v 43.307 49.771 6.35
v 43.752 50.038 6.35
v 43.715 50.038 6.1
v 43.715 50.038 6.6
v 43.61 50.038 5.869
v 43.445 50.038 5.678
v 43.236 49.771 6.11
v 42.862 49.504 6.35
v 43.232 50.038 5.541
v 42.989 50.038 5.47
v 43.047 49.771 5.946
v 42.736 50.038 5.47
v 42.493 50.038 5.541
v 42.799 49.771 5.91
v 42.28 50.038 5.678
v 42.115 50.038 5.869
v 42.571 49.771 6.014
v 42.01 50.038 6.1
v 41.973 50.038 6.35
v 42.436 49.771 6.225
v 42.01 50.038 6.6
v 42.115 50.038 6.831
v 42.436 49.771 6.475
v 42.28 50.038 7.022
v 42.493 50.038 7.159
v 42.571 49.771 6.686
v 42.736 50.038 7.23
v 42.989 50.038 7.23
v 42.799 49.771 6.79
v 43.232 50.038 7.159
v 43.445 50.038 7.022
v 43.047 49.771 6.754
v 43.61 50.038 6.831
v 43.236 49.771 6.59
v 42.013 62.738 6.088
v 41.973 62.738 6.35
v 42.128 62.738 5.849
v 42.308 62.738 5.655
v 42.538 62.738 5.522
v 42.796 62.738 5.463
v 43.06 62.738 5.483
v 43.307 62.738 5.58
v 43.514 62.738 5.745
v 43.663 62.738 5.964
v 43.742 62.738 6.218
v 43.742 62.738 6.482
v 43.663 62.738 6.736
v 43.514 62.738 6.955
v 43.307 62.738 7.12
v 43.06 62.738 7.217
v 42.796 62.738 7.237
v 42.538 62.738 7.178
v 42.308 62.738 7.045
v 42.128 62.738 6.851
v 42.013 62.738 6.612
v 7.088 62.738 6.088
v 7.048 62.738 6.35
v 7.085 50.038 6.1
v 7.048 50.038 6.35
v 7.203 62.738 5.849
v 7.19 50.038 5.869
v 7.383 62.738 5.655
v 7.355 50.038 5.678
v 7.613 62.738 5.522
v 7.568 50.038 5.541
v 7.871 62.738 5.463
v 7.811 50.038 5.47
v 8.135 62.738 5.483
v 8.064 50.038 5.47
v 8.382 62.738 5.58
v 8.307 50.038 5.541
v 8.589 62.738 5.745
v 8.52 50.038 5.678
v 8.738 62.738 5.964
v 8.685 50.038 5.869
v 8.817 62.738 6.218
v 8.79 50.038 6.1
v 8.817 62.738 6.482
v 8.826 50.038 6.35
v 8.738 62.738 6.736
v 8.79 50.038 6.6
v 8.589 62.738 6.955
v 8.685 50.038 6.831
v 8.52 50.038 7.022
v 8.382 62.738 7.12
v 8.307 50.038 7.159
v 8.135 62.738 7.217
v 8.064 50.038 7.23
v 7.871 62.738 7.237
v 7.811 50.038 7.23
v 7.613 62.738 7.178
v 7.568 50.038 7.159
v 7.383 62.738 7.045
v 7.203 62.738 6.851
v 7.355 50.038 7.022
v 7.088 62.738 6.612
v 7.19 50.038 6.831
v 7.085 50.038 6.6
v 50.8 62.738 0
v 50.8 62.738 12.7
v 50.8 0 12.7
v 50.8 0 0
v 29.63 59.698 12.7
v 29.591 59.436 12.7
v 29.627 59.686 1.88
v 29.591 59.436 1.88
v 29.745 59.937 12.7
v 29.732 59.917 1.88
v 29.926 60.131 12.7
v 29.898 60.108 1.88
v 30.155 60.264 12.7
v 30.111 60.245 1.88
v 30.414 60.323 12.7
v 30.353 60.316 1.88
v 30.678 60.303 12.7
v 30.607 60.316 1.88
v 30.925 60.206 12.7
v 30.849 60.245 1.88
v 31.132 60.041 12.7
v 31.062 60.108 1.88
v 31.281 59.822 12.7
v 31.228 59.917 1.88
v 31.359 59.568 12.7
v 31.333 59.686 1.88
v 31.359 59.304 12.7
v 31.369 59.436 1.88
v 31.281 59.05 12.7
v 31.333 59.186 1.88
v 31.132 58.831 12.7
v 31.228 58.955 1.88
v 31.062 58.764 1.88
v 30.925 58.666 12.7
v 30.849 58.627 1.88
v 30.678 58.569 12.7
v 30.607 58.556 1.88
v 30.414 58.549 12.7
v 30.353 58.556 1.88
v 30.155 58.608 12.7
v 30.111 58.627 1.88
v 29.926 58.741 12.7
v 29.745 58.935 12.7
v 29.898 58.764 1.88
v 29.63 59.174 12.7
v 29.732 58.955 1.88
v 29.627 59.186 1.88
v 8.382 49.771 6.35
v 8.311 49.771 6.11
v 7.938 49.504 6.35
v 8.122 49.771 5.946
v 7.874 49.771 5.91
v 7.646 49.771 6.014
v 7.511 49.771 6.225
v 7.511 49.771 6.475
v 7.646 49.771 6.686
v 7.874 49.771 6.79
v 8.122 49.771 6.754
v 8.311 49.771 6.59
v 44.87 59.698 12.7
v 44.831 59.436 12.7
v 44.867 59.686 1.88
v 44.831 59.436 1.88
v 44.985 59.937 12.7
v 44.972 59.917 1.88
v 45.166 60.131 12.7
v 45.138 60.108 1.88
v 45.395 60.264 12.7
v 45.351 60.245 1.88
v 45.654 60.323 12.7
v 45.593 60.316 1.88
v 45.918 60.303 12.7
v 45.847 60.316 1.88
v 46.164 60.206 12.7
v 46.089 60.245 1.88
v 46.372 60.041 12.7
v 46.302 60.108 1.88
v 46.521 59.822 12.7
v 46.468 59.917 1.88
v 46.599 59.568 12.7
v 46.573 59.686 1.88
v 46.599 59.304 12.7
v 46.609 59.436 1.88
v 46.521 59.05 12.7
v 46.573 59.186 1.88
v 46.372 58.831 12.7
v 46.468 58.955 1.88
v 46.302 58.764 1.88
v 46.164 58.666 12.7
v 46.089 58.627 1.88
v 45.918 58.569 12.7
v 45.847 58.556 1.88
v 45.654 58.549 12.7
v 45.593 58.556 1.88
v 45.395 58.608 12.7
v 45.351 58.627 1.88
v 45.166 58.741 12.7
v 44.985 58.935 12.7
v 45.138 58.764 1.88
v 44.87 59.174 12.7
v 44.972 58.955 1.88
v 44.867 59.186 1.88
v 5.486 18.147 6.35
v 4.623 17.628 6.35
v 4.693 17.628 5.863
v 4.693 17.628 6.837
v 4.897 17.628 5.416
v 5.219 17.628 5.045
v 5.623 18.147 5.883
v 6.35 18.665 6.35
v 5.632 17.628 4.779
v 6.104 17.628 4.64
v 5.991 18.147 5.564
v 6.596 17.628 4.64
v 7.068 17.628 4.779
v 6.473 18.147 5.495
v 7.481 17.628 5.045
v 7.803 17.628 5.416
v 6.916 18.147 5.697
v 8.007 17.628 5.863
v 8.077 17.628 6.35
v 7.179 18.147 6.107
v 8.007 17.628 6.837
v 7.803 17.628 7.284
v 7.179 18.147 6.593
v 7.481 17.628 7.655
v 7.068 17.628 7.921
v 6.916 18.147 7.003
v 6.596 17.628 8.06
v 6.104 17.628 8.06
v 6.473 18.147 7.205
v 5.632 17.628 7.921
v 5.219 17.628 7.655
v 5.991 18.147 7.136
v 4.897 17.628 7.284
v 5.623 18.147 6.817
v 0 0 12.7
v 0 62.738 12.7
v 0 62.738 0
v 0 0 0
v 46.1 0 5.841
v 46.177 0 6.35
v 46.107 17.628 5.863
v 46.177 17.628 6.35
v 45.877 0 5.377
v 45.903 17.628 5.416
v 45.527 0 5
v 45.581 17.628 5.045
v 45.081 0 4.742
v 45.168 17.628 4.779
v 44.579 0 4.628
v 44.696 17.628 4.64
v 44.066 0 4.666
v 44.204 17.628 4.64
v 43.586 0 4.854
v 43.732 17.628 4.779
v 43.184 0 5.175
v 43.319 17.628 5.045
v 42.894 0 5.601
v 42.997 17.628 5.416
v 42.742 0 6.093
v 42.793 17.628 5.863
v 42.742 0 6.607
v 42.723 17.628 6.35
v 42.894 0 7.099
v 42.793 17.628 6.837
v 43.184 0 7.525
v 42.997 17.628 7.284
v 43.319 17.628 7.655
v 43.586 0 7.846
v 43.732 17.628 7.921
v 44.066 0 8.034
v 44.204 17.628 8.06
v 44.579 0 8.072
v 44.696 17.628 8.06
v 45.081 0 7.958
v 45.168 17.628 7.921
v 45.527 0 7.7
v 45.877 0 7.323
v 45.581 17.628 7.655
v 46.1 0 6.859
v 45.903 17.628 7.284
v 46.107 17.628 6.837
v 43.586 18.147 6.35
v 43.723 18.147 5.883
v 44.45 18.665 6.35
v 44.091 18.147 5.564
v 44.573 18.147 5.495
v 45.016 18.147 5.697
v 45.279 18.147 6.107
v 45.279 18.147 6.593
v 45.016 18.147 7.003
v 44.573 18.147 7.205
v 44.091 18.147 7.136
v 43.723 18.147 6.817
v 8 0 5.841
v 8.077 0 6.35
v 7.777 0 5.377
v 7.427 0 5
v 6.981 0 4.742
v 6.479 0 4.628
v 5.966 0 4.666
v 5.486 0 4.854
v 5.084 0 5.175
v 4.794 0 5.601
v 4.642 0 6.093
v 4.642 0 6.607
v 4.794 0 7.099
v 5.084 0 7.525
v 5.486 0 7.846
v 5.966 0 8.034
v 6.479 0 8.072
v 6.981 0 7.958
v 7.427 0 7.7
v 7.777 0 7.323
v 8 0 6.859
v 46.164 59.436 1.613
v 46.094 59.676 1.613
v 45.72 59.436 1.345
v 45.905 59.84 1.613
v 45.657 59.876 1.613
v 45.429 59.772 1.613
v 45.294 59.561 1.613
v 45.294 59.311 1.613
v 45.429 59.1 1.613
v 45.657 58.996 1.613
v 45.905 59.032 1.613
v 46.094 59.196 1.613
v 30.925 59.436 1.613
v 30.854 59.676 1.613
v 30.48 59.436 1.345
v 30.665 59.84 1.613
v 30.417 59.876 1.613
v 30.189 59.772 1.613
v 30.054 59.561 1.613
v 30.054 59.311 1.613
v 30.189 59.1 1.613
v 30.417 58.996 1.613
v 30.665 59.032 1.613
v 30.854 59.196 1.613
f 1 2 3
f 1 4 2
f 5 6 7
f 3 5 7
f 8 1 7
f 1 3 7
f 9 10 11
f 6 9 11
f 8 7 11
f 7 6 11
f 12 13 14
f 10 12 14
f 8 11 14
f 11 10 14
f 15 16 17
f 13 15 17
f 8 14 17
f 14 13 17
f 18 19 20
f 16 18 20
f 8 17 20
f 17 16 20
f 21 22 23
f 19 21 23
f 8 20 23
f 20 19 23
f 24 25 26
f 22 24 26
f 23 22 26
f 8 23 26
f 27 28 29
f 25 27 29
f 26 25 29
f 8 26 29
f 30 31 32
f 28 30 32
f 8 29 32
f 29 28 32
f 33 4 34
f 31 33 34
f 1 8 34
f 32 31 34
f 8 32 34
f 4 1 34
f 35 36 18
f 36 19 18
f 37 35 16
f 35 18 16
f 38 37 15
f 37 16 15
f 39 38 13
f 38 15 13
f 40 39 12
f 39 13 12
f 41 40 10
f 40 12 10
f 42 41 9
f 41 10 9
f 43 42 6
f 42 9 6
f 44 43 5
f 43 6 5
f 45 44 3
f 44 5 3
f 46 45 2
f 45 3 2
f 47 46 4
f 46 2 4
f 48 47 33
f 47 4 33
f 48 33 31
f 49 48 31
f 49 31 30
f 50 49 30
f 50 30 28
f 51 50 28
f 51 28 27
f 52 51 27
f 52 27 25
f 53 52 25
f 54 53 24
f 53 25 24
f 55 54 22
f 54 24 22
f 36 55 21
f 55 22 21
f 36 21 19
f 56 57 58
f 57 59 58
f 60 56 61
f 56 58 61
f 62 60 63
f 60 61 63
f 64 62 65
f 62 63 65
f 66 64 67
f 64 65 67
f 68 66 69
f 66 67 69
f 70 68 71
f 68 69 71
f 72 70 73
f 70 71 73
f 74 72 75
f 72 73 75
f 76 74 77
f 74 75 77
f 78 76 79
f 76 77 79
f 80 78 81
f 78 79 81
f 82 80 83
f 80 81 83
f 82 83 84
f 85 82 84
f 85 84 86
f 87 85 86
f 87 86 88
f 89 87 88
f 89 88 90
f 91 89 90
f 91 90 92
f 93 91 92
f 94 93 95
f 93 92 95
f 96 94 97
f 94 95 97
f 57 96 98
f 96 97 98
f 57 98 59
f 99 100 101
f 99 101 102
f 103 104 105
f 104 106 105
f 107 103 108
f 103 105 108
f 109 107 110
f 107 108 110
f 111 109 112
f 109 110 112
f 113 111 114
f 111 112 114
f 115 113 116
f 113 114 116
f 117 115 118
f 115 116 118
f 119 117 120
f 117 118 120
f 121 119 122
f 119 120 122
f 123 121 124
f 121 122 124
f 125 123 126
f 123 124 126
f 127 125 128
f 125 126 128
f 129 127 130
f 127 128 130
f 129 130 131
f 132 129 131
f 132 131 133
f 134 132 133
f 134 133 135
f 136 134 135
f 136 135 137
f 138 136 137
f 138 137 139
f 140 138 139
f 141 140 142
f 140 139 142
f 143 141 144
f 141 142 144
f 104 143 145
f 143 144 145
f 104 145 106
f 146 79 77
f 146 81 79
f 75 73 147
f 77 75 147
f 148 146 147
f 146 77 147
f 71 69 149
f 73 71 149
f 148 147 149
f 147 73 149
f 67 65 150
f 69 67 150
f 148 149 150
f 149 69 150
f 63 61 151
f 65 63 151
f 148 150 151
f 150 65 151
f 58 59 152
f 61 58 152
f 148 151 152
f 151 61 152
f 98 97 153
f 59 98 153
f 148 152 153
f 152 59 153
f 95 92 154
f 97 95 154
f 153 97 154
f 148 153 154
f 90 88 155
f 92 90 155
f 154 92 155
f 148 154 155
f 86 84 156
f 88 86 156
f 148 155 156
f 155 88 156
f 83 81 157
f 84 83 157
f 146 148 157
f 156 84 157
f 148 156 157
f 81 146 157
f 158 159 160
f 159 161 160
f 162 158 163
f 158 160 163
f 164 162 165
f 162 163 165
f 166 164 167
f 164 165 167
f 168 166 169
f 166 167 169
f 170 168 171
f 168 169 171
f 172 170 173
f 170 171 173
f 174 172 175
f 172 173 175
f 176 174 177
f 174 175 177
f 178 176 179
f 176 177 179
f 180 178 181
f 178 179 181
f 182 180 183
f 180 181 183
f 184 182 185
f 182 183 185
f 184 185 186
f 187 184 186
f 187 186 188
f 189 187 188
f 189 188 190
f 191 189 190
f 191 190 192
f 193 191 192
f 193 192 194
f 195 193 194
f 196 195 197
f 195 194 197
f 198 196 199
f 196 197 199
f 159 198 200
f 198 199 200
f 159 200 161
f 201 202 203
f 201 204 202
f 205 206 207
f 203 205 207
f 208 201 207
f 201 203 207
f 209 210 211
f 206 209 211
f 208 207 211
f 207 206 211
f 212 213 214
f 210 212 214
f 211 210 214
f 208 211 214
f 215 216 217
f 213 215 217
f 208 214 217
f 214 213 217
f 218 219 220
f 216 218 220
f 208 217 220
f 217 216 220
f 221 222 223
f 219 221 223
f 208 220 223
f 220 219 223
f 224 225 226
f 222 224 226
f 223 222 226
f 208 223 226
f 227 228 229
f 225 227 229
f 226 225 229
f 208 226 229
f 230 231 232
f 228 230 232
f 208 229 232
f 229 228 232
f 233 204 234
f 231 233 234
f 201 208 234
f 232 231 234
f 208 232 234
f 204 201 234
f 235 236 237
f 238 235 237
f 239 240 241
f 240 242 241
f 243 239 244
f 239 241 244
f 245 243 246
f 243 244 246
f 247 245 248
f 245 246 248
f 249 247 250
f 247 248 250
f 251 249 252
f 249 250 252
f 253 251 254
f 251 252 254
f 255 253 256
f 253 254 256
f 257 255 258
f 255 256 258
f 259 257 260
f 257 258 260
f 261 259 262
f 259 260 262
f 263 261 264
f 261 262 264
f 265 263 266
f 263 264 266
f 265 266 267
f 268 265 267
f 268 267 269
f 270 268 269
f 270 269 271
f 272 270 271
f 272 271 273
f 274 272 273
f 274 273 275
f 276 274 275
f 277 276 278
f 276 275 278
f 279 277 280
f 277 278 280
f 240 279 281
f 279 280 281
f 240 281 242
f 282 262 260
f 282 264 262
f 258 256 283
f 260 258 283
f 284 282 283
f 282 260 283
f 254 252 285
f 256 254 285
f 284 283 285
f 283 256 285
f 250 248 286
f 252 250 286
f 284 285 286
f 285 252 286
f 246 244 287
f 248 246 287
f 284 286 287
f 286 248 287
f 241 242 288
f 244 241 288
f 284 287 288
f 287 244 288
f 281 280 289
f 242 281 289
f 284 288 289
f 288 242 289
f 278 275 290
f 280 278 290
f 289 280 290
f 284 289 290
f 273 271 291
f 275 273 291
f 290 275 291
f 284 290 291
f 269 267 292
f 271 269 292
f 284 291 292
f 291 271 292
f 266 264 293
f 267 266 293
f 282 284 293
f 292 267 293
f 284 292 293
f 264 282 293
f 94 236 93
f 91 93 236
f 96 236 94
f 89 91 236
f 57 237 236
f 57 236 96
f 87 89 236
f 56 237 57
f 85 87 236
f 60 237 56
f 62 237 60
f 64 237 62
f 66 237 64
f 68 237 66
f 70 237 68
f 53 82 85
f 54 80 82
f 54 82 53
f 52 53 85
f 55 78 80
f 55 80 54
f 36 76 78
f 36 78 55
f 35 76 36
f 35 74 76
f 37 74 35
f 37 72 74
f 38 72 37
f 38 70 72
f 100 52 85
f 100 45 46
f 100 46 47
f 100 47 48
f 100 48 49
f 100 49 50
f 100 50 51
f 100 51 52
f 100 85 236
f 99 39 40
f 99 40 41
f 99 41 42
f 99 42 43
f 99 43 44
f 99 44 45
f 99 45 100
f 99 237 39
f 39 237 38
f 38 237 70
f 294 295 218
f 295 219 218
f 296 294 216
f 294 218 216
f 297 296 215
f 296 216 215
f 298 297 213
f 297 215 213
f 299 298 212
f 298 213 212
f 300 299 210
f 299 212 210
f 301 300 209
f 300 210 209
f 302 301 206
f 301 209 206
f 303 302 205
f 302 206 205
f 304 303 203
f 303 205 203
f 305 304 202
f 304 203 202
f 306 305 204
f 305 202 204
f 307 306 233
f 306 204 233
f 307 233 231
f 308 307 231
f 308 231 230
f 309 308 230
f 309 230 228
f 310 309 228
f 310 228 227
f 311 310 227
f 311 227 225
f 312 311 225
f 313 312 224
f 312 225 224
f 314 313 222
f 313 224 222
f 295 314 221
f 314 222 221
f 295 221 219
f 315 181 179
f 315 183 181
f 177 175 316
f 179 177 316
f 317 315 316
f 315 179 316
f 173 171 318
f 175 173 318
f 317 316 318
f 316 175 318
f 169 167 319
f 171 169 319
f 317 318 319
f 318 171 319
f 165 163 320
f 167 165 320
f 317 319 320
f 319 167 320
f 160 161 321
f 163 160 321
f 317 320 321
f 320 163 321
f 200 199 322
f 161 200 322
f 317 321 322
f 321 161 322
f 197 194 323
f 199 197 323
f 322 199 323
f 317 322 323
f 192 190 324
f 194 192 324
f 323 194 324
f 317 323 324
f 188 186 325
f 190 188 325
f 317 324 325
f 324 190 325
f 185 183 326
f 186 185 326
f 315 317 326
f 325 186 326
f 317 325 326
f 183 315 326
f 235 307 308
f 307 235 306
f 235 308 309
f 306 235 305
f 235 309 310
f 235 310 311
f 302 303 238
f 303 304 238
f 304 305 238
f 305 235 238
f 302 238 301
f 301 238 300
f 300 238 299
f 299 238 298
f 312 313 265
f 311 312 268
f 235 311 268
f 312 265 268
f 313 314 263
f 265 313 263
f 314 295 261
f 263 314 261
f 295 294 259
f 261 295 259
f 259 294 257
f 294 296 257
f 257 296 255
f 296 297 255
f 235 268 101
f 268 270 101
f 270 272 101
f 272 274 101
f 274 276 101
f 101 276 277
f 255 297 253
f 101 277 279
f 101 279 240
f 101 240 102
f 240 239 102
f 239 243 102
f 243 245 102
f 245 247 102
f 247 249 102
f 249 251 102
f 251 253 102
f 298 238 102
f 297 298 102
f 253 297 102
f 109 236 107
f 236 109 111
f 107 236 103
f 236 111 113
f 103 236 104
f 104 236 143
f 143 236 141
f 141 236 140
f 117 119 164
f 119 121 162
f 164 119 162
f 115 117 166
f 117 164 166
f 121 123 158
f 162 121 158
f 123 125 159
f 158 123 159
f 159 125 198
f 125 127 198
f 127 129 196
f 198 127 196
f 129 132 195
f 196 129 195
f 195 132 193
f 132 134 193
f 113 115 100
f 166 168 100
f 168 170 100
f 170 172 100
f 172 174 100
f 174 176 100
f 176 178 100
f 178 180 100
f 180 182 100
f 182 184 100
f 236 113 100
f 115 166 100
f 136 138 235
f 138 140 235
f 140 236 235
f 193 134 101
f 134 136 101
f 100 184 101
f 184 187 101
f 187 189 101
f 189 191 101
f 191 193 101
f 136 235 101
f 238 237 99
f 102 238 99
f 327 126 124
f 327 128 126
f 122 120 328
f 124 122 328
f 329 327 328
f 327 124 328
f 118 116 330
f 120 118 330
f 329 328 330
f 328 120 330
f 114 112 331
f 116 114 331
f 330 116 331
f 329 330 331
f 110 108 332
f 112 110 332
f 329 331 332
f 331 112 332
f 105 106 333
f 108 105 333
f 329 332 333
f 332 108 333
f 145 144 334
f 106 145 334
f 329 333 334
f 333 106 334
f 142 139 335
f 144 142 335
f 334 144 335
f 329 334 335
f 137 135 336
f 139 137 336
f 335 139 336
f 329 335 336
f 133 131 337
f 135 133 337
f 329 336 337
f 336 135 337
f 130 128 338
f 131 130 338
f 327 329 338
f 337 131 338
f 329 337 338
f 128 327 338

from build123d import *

# Parameters (mm, degrees)
SKETCH1_W                 = 50.8
SKETCH1_H                 = 12.7
BOSS_EXTRUDE1_DEPTH       = 62.738
F_8_32_TAPPED_HOLE1_D     = 3.4544
F_8_32_TAPPED_HOLE1_DEPTH = 17.6276
F_8_32_TAPPED_HOLE1_TIP   = 1.037806461
F_2_56_TAPPED_HOLE1_D     = 1.778
F_2_56_TAPPED_HOLE1_DEPTH = 12.7
F_2_56_TAPPED_HOLE1_TIP   = 0.53416509
F_2_56_TAPPED_HOLE2_D     = 1.778
F_2_56_TAPPED_HOLE2_DEPTH = 10.8204
F_2_56_TAPPED_HOLE2_TIP   = 0.53416509


with BuildPart() as part:
    # Sketch1 → Boss-Extrude1 (new body)
    with BuildSketch(Plane(origin=(0, 0, 0), x_dir=(1, 0, 0), z_dir=(0, 1, 0))):
        with Locations((25.4, -6.35)):
            Rectangle(SKETCH1_W, SKETCH1_H)
    extrude(amount=BOSS_EXTRUDE1_DEPTH)

    # #8-32 Tapped Hole1
    with Locations(Plane(origin=(0, 0, 0), x_dir=(-1, 0, 0), z_dir=(0, -1, 0))):
        with Locations((-6.35, -6.35), (-44.45, -6.35)):
            Hole(F_8_32_TAPPED_HOLE1_D / 2, depth=F_8_32_TAPPED_HOLE1_DEPTH)
            with Locations((0, 0, -(F_8_32_TAPPED_HOLE1_DEPTH + F_8_32_TAPPED_HOLE1_TIP / 2))):  # 118° drill point
                Cone(0, F_8_32_TAPPED_HOLE1_D / 2, F_8_32_TAPPED_HOLE1_TIP, mode=Mode.SUBTRACT)

    # #2-56 Tapped Hole1
    with Locations(Plane(origin=(0, 62.738, 0), x_dir=(1, 0, 0), z_dir=(0, 1, 0))):
        with Locations((7.9375, -6.35), (42.8625, -6.35)):
            Hole(F_2_56_TAPPED_HOLE1_D / 2, depth=F_2_56_TAPPED_HOLE1_DEPTH)
            with Locations((0, 0, -(F_2_56_TAPPED_HOLE1_DEPTH + F_2_56_TAPPED_HOLE1_TIP / 2))):  # 118° drill point
                Cone(0, F_2_56_TAPPED_HOLE1_D / 2, F_2_56_TAPPED_HOLE1_TIP, mode=Mode.SUBTRACT)

    # #2-56 Tapped Hole2
    with Locations(Plane.XY.offset(12.7)):
        with Locations((30.48, 59.436), (45.72, 59.436)):
            Hole(F_2_56_TAPPED_HOLE2_D / 2, depth=F_2_56_TAPPED_HOLE2_DEPTH)
            with Locations((0, 0, -(F_2_56_TAPPED_HOLE2_DEPTH + F_2_56_TAPPED_HOLE2_TIP / 2))):  # 118° drill point
                Cone(0, F_2_56_TAPPED_HOLE2_D / 2, F_2_56_TAPPED_HOLE2_TIP, mode=Mode.SUBTRACT)


solid = part.part
